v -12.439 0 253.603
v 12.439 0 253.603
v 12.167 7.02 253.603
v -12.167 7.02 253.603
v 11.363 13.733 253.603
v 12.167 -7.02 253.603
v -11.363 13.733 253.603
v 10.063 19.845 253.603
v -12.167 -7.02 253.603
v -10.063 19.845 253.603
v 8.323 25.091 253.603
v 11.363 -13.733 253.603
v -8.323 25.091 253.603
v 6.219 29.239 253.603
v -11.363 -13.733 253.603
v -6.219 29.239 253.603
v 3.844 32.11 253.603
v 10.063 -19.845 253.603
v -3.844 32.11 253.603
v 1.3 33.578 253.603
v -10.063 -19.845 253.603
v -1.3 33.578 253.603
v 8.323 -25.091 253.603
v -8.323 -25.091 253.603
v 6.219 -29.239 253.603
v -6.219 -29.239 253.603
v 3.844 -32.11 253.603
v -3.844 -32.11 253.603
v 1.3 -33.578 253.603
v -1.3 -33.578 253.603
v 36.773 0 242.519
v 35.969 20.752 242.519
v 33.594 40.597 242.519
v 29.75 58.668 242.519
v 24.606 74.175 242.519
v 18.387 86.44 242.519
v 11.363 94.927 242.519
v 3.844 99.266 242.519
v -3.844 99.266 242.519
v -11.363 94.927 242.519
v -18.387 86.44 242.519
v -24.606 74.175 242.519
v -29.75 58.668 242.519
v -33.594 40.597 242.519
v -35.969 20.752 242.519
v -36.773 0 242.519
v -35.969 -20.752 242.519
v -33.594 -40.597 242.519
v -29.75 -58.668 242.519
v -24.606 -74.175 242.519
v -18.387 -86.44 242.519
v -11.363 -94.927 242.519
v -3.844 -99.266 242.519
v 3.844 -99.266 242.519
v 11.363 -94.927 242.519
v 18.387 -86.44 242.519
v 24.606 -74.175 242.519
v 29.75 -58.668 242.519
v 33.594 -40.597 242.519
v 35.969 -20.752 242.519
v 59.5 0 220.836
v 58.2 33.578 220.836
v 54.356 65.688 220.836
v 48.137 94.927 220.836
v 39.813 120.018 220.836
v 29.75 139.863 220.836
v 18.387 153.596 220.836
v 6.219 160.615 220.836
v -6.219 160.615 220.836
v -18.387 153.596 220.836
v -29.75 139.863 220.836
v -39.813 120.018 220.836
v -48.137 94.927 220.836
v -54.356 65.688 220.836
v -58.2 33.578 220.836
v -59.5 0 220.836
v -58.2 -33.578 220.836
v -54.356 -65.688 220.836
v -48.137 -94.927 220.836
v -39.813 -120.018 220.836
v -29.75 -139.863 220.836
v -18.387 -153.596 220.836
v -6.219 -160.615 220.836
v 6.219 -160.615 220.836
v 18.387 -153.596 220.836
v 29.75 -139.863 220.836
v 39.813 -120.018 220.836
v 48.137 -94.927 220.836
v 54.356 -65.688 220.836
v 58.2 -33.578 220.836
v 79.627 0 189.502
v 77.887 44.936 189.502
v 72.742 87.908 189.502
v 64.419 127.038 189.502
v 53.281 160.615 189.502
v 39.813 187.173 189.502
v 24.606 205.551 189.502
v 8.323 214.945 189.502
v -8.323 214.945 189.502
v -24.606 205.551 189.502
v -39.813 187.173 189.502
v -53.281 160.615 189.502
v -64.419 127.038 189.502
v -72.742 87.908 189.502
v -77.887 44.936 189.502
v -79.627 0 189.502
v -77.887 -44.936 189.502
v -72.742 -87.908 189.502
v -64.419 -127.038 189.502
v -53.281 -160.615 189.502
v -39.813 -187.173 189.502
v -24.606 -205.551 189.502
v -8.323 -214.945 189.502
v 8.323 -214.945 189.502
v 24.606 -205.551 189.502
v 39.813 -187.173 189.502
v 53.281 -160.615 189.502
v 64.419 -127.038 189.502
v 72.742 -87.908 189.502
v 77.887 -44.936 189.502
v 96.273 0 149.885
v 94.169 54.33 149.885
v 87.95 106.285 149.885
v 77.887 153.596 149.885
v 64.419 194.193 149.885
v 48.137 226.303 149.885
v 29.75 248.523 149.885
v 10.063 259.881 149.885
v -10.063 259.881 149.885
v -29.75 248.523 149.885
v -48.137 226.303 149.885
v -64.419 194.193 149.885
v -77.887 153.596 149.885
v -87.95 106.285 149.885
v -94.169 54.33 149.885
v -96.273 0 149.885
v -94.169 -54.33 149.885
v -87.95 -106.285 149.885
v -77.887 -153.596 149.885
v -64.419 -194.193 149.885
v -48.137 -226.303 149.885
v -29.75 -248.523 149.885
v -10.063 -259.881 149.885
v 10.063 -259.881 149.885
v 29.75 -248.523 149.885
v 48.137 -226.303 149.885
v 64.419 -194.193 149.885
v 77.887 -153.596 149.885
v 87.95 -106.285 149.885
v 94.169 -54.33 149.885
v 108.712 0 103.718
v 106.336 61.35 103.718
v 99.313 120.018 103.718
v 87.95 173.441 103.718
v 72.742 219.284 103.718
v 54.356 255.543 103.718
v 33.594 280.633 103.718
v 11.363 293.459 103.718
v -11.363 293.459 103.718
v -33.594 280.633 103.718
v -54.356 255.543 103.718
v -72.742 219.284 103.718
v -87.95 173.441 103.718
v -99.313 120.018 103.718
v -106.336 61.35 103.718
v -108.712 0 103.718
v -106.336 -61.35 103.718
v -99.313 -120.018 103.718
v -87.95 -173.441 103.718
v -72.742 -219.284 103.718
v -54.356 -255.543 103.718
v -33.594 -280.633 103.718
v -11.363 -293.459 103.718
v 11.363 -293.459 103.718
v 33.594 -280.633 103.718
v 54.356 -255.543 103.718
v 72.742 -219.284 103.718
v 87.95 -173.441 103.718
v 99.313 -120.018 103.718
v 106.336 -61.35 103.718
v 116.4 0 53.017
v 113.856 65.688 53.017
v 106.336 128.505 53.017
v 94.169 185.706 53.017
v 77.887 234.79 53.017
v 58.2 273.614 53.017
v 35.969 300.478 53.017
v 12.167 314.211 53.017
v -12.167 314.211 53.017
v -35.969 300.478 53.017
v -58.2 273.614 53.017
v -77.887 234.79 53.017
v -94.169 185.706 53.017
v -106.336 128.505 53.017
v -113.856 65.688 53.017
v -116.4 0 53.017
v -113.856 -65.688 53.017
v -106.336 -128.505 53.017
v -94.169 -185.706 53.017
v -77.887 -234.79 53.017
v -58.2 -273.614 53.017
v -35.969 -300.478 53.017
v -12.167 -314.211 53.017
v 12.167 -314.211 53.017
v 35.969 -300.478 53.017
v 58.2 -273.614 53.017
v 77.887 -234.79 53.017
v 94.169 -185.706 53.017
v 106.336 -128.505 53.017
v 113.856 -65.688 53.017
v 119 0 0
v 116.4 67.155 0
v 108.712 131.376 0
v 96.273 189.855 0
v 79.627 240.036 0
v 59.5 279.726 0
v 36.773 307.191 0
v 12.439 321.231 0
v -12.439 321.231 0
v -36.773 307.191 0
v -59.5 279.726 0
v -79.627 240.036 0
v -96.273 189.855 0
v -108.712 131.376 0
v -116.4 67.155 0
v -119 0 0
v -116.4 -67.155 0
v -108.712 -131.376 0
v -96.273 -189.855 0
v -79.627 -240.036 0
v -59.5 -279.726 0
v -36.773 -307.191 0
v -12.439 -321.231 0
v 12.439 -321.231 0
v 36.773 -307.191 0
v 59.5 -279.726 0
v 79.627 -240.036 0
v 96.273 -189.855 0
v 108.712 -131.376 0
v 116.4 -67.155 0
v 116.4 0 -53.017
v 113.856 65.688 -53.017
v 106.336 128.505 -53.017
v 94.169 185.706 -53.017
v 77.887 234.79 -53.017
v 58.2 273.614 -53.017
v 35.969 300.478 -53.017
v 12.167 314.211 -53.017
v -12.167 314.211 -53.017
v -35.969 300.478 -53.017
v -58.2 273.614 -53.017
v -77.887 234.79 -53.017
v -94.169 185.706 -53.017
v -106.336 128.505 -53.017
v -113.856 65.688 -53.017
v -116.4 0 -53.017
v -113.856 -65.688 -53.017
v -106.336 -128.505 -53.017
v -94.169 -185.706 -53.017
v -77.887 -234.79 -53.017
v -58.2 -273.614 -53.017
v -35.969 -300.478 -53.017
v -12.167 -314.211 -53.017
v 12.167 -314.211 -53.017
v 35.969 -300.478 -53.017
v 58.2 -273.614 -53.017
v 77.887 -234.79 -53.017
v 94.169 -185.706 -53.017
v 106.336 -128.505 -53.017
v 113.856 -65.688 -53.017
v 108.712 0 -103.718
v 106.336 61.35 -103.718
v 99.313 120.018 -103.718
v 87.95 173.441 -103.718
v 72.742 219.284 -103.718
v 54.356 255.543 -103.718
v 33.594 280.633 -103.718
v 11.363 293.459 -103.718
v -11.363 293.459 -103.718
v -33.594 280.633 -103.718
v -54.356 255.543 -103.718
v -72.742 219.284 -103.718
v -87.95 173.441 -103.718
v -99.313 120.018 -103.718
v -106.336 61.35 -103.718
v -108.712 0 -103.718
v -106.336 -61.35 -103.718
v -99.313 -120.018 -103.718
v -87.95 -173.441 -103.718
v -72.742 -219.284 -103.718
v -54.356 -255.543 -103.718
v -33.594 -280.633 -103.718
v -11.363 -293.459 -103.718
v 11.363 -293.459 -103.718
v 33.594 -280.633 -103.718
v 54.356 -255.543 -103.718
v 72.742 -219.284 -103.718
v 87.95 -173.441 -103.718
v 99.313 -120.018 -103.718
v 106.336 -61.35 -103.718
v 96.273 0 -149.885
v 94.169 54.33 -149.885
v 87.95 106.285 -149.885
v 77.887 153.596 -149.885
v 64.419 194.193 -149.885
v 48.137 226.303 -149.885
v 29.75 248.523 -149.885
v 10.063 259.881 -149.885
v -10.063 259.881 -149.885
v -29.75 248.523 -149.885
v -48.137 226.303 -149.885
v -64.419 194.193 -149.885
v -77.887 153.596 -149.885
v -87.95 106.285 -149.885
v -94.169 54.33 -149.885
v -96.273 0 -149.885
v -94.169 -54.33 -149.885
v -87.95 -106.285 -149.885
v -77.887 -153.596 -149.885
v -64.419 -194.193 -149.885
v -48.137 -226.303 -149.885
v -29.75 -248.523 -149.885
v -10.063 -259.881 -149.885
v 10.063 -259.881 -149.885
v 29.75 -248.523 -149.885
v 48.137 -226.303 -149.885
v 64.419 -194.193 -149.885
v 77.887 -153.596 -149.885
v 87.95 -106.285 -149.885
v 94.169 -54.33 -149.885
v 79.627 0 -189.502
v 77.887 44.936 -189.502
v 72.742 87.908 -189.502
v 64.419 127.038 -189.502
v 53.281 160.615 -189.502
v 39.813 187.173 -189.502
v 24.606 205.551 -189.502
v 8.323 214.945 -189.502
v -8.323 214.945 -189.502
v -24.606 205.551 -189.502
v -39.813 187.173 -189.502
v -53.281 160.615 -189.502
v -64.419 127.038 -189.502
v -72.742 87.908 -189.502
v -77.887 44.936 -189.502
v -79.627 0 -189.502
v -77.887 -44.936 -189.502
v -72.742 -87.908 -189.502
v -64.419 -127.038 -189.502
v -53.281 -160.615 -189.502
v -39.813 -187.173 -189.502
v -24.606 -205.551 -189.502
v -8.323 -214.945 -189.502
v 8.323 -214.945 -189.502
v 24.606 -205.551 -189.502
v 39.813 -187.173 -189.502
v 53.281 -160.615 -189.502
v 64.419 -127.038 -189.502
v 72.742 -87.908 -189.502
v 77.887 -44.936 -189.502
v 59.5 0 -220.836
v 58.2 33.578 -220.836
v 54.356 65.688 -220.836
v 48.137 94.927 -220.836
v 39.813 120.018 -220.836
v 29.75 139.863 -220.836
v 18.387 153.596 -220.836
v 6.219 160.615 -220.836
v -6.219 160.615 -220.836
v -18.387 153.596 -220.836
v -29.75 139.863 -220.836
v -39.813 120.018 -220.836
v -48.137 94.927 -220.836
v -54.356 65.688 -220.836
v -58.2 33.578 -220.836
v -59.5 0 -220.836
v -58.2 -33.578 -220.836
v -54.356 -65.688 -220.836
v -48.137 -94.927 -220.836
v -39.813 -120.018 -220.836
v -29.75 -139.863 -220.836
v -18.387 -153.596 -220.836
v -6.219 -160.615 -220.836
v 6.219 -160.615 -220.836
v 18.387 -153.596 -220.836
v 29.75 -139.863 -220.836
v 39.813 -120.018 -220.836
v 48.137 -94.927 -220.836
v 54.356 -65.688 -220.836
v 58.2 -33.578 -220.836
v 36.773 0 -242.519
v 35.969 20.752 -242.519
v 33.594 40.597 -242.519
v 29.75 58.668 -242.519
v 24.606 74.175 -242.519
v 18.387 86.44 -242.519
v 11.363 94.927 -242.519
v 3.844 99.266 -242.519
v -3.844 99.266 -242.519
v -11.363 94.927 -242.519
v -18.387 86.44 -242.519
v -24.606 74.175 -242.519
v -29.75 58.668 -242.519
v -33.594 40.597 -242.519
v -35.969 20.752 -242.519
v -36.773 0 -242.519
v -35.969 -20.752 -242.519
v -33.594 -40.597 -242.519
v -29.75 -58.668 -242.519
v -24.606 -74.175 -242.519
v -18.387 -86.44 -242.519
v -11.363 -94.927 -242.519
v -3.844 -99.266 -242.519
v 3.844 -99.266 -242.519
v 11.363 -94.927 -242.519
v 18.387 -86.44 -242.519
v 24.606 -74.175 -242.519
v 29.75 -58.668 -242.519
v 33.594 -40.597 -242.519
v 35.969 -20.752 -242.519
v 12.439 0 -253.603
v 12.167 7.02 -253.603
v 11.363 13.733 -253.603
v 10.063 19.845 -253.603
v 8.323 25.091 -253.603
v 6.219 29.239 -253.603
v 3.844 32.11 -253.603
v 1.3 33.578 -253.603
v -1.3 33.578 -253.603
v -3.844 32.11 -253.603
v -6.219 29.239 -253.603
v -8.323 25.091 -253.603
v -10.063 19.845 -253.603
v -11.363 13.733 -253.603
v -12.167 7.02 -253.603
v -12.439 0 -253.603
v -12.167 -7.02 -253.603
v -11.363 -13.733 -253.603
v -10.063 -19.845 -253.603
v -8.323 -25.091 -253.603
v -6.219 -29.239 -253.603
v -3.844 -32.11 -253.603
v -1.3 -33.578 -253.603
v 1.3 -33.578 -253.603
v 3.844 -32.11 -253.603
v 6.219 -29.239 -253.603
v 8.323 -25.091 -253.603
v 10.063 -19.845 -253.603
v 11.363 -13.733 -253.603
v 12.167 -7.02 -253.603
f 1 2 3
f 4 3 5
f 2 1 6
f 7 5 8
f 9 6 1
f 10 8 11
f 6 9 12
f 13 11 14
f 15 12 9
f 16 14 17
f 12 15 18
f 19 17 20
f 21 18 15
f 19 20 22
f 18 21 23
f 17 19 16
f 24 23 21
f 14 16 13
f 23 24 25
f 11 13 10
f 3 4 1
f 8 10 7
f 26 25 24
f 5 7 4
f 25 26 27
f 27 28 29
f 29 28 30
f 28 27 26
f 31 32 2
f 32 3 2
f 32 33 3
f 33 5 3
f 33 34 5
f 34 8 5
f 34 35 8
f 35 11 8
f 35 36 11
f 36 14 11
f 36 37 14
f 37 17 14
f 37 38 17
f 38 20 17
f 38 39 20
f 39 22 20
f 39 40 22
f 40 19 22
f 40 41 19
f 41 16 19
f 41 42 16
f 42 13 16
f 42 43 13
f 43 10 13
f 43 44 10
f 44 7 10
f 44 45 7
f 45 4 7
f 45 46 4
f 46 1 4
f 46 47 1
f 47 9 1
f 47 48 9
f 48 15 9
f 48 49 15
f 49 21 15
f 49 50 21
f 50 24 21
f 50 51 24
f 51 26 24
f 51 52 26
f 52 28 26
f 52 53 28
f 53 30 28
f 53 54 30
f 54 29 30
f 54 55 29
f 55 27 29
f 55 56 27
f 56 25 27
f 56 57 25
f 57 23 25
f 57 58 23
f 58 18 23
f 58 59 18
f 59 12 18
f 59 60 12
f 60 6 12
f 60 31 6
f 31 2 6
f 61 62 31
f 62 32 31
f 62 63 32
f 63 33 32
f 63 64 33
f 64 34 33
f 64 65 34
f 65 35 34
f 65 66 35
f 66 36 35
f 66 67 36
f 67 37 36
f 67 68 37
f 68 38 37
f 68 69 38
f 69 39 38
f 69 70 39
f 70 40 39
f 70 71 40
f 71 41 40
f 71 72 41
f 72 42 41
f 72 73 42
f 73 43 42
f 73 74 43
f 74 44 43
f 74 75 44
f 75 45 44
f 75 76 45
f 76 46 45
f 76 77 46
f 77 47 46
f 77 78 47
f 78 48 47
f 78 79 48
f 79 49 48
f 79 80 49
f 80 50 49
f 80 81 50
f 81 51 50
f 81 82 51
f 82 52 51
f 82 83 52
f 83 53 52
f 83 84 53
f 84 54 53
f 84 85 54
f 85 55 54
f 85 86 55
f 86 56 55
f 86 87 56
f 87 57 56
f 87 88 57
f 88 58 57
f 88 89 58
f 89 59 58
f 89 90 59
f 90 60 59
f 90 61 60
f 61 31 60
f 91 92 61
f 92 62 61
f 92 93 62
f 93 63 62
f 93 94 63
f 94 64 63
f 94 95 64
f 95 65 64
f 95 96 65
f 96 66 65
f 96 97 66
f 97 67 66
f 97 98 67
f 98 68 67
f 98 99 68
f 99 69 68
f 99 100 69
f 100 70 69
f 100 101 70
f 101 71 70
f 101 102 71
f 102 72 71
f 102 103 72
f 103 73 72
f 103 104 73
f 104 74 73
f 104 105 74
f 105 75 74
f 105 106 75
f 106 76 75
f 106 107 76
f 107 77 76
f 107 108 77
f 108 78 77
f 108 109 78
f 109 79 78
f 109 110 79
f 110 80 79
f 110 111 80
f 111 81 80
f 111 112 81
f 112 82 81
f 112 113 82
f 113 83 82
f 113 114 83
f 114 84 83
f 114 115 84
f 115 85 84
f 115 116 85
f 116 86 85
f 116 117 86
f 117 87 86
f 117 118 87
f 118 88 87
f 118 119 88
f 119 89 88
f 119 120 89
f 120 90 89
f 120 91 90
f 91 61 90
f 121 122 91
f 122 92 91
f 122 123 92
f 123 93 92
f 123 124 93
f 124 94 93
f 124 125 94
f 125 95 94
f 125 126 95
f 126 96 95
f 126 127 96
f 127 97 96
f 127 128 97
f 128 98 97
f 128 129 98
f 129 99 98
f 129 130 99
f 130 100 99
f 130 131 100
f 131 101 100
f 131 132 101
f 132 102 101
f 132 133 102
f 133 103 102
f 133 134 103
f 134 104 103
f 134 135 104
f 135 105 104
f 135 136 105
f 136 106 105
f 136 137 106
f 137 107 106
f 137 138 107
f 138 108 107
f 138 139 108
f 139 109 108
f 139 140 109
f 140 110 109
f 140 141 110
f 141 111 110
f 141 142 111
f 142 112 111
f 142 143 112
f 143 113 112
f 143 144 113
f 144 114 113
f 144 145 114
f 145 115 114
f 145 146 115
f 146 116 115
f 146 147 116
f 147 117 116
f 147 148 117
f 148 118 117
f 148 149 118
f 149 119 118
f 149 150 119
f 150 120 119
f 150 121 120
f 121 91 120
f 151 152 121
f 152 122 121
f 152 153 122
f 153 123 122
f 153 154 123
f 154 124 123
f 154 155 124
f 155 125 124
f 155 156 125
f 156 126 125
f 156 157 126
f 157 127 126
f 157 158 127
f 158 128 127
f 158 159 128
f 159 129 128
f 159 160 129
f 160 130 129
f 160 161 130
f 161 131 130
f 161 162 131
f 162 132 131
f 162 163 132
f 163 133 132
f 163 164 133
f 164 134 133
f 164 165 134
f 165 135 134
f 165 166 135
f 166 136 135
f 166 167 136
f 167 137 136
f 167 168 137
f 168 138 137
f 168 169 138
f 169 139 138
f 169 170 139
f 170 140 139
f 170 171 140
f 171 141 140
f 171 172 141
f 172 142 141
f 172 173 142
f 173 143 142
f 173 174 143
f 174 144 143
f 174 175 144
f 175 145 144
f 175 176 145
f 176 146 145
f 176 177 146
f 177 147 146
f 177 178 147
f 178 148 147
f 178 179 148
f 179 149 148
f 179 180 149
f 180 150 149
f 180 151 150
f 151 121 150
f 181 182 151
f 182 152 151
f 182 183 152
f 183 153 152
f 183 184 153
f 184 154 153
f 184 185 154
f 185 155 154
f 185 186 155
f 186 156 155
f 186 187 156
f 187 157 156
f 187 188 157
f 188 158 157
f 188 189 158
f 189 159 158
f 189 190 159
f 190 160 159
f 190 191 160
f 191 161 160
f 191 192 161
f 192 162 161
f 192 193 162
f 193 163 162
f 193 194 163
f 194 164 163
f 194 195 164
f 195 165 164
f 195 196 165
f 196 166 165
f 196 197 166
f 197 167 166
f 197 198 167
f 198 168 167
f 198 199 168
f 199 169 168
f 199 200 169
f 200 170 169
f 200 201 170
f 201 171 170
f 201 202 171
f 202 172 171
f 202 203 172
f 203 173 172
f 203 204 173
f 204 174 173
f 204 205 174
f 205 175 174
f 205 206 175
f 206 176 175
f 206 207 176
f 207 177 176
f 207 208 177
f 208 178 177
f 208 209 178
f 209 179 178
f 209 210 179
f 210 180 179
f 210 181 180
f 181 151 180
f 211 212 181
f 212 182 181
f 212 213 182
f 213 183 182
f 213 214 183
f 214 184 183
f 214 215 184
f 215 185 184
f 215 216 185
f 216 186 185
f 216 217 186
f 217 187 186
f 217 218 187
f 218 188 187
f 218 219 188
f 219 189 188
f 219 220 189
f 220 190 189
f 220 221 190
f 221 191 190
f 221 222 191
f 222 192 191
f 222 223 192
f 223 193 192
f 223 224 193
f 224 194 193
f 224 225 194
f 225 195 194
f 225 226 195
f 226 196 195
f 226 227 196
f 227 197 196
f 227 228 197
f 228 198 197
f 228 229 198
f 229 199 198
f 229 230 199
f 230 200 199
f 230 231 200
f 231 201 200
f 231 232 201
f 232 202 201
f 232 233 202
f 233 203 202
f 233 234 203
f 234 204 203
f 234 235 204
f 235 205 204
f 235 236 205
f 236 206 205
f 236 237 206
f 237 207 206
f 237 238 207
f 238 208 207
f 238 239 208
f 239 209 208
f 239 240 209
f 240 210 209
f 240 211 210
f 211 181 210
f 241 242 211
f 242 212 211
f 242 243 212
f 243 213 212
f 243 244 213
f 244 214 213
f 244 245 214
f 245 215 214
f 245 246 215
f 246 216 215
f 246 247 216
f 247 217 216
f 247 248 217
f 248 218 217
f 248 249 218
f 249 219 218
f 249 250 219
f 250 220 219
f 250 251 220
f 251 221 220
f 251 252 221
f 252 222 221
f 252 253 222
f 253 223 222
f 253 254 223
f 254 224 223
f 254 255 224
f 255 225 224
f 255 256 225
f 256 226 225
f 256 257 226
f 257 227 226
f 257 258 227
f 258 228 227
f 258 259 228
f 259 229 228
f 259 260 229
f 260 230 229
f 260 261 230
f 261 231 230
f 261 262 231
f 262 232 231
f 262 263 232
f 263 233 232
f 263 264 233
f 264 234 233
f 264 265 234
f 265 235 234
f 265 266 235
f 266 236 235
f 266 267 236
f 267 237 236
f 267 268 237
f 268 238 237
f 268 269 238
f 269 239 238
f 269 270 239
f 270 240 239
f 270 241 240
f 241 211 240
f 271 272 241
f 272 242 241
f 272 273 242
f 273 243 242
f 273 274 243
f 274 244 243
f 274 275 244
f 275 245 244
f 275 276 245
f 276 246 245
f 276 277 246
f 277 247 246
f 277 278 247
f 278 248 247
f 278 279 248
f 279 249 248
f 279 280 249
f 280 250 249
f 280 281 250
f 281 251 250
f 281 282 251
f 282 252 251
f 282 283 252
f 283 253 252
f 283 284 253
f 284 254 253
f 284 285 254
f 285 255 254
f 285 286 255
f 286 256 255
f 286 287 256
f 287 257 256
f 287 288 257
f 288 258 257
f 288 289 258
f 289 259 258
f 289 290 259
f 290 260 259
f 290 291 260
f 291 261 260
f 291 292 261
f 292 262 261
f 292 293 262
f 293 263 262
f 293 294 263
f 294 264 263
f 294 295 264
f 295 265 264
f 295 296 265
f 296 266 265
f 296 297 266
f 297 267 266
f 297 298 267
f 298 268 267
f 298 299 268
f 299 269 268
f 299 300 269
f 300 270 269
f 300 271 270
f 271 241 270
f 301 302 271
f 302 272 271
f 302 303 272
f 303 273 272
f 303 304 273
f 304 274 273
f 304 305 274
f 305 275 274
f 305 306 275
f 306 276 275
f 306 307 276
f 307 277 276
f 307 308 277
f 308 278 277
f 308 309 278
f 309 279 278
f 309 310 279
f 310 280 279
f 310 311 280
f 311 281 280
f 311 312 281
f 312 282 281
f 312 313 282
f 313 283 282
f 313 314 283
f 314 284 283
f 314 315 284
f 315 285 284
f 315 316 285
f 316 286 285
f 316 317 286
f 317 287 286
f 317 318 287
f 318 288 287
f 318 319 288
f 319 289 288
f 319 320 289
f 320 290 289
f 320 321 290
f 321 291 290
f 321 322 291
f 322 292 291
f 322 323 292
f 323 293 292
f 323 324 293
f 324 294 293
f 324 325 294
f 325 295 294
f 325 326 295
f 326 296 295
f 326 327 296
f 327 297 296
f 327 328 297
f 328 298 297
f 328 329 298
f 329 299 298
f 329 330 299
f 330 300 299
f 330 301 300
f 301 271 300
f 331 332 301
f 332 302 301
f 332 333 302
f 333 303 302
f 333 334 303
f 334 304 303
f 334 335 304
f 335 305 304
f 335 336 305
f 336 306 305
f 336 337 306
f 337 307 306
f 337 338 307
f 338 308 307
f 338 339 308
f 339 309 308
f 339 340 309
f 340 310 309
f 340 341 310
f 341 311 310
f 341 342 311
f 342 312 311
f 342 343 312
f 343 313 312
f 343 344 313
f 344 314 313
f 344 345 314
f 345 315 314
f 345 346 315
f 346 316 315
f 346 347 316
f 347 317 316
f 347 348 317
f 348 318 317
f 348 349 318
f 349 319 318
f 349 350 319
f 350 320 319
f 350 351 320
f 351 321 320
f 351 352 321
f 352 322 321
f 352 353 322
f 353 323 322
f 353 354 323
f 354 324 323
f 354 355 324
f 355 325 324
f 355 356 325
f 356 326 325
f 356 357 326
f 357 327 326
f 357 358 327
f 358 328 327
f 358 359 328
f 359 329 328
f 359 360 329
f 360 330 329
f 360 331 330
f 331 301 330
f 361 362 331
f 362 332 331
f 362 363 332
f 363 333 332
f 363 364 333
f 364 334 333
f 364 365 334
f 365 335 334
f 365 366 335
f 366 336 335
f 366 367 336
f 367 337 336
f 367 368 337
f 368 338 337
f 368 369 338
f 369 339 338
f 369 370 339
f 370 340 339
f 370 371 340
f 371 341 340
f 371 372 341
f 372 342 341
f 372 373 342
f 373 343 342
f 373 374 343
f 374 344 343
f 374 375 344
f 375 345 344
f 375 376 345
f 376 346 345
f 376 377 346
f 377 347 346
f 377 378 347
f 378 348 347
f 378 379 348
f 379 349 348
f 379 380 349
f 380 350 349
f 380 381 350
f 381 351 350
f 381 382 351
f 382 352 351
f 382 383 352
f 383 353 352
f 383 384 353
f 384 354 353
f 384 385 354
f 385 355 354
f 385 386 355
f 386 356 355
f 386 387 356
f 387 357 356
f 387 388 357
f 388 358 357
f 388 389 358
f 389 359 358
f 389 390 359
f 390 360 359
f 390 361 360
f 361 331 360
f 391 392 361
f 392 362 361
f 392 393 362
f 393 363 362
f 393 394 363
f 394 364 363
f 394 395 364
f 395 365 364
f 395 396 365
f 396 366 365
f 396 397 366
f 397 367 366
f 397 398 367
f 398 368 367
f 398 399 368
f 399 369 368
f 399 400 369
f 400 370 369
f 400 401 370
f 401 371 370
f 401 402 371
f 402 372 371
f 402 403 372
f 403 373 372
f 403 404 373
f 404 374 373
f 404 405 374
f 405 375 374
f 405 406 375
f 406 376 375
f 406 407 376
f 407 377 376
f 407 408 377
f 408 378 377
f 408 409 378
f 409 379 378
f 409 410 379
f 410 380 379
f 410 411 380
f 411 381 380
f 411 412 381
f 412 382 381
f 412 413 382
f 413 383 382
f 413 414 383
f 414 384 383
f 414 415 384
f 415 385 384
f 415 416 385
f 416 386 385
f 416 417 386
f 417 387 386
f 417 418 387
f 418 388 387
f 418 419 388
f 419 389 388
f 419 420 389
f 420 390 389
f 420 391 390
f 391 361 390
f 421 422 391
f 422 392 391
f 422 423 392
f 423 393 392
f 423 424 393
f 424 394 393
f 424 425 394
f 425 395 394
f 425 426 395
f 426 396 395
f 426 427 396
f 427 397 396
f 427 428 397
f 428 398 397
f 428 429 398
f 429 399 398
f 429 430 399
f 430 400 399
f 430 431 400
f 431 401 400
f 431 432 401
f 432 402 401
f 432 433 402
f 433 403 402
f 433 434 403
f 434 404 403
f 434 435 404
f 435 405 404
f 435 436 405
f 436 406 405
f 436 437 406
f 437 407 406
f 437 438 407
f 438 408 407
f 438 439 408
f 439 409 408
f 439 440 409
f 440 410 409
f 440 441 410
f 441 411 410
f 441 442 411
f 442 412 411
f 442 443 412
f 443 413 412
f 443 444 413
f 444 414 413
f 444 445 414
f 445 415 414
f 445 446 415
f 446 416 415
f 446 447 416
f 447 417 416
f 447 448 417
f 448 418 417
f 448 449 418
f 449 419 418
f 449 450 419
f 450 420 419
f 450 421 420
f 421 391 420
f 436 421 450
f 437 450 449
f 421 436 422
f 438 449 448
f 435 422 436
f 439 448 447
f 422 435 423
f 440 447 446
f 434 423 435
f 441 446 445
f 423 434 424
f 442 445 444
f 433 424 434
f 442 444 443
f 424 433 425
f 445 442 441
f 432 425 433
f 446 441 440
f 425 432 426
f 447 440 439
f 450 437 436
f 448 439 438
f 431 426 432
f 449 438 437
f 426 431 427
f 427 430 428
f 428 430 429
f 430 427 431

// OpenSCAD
// Generated by SolidPython 1.0.1 on 2020-07-29 00:46:48


scale(v = [7, 19, 15]) {
	sphere(r = 17);
}
/***********************************************
*********      SolidPython code:      **********
************************************************
 
# import packages: SolidPython
from solid import *
from solid.utils import *
from itertools import chain, combinations, permutations


class Resize:

    def __init__(self, scad_file):
        self.scad_file = scad_file
        #self.scad_file = import_scad(scad_file)
        # cone/cylinder param:
        self.r1 = 0
        self.r2 = 0
        self.h = 0
        # rectangular prism param:
        self.w = 0
        self.l = 0
        # ellipse param:
        self.r = 0

    # import OpenScad code (file name corresponds to shape)


    # classify shape + parameters
    def assign(self, param1, param2, param3):
        if self.scad_file == 'cone.scad':
            self.r1 = param1
            self.r2 = param2
            self.h = param3
        elif self.scad_file == 'cylinder.scad':
            self.r1 = param1
            self.r2 = param2
            self.h = param3
        elif self.scad_file == 'rectangularPrism.scad':
            self.h = param1
            self.l = param2
            self.w = param3
        else:
            self.r = param1
            self.h = param2

    # resize parameters
    def iterate(self):
        x = range(3, 20, 2)
        i = 1
        if self.scad_file == 'cone.scad':
            tempList = list(permutations(x, 2))
            for temp in tempList:
                param1 = temp[0]
                param2 = temp[1]
                filepath = 'produced_scad_files/' + 'cone' + str(param1) + '_' + str(param2) + '_' + '.scad'
                scad_render_to_file(cylinder(h=param1, r1=param2, r2=0), filepath)

        elif self.scad_file == 'cylinder.scad':
            tempList = list(permutations(x, 3))
            for temp in tempList:
                param1 = temp[0]
                param2 = temp[1]
                filepath = 'produced_scad_files/' + 'cylinder' + str(param1) + '_' + str(param2) + '_' + '.scad'
                scad_render_to_file(cylinder(h=param1, r1=param2, r2=param2), filepath)

        elif self.scad_file == 'rectangularPrism.scad':
            tempList = list(permutations(x, 3))
            for temp in tempList:
                param1 = temp[0]
                param2 = temp[1]
                param3 = temp[2]
                filepath = 'produced_scad_files/' + 'rectangularPrism' + str(param1) + '_' + str(param2) + '_' + str(
                    param3) + '.scad'
                scad_render_to_file(cube(size=(param1, param2, param3)), filepath)

        elif self.scad_file == 'ellipse.scad':
            tempList = list(permutations(x, 4))
            for temp in tempList:
                param1 = temp[0]
                param2 = temp[1]
                param3 = temp[2]
                param4 = temp[3]
                filepath = 'produced_scad_files/' + 'ellipse' + str(param1) + '_' + str(param2) + '_' + str(param3) + '_' + str(param4) + '.scad'
                scad_render_to_file(scale([param1, param2, param3])(sphere(r=param4)), filepath)

    def render_to_scadfile(self):
        scad_render_to_file(scad, 'example.scad') 
 
************************************************/
